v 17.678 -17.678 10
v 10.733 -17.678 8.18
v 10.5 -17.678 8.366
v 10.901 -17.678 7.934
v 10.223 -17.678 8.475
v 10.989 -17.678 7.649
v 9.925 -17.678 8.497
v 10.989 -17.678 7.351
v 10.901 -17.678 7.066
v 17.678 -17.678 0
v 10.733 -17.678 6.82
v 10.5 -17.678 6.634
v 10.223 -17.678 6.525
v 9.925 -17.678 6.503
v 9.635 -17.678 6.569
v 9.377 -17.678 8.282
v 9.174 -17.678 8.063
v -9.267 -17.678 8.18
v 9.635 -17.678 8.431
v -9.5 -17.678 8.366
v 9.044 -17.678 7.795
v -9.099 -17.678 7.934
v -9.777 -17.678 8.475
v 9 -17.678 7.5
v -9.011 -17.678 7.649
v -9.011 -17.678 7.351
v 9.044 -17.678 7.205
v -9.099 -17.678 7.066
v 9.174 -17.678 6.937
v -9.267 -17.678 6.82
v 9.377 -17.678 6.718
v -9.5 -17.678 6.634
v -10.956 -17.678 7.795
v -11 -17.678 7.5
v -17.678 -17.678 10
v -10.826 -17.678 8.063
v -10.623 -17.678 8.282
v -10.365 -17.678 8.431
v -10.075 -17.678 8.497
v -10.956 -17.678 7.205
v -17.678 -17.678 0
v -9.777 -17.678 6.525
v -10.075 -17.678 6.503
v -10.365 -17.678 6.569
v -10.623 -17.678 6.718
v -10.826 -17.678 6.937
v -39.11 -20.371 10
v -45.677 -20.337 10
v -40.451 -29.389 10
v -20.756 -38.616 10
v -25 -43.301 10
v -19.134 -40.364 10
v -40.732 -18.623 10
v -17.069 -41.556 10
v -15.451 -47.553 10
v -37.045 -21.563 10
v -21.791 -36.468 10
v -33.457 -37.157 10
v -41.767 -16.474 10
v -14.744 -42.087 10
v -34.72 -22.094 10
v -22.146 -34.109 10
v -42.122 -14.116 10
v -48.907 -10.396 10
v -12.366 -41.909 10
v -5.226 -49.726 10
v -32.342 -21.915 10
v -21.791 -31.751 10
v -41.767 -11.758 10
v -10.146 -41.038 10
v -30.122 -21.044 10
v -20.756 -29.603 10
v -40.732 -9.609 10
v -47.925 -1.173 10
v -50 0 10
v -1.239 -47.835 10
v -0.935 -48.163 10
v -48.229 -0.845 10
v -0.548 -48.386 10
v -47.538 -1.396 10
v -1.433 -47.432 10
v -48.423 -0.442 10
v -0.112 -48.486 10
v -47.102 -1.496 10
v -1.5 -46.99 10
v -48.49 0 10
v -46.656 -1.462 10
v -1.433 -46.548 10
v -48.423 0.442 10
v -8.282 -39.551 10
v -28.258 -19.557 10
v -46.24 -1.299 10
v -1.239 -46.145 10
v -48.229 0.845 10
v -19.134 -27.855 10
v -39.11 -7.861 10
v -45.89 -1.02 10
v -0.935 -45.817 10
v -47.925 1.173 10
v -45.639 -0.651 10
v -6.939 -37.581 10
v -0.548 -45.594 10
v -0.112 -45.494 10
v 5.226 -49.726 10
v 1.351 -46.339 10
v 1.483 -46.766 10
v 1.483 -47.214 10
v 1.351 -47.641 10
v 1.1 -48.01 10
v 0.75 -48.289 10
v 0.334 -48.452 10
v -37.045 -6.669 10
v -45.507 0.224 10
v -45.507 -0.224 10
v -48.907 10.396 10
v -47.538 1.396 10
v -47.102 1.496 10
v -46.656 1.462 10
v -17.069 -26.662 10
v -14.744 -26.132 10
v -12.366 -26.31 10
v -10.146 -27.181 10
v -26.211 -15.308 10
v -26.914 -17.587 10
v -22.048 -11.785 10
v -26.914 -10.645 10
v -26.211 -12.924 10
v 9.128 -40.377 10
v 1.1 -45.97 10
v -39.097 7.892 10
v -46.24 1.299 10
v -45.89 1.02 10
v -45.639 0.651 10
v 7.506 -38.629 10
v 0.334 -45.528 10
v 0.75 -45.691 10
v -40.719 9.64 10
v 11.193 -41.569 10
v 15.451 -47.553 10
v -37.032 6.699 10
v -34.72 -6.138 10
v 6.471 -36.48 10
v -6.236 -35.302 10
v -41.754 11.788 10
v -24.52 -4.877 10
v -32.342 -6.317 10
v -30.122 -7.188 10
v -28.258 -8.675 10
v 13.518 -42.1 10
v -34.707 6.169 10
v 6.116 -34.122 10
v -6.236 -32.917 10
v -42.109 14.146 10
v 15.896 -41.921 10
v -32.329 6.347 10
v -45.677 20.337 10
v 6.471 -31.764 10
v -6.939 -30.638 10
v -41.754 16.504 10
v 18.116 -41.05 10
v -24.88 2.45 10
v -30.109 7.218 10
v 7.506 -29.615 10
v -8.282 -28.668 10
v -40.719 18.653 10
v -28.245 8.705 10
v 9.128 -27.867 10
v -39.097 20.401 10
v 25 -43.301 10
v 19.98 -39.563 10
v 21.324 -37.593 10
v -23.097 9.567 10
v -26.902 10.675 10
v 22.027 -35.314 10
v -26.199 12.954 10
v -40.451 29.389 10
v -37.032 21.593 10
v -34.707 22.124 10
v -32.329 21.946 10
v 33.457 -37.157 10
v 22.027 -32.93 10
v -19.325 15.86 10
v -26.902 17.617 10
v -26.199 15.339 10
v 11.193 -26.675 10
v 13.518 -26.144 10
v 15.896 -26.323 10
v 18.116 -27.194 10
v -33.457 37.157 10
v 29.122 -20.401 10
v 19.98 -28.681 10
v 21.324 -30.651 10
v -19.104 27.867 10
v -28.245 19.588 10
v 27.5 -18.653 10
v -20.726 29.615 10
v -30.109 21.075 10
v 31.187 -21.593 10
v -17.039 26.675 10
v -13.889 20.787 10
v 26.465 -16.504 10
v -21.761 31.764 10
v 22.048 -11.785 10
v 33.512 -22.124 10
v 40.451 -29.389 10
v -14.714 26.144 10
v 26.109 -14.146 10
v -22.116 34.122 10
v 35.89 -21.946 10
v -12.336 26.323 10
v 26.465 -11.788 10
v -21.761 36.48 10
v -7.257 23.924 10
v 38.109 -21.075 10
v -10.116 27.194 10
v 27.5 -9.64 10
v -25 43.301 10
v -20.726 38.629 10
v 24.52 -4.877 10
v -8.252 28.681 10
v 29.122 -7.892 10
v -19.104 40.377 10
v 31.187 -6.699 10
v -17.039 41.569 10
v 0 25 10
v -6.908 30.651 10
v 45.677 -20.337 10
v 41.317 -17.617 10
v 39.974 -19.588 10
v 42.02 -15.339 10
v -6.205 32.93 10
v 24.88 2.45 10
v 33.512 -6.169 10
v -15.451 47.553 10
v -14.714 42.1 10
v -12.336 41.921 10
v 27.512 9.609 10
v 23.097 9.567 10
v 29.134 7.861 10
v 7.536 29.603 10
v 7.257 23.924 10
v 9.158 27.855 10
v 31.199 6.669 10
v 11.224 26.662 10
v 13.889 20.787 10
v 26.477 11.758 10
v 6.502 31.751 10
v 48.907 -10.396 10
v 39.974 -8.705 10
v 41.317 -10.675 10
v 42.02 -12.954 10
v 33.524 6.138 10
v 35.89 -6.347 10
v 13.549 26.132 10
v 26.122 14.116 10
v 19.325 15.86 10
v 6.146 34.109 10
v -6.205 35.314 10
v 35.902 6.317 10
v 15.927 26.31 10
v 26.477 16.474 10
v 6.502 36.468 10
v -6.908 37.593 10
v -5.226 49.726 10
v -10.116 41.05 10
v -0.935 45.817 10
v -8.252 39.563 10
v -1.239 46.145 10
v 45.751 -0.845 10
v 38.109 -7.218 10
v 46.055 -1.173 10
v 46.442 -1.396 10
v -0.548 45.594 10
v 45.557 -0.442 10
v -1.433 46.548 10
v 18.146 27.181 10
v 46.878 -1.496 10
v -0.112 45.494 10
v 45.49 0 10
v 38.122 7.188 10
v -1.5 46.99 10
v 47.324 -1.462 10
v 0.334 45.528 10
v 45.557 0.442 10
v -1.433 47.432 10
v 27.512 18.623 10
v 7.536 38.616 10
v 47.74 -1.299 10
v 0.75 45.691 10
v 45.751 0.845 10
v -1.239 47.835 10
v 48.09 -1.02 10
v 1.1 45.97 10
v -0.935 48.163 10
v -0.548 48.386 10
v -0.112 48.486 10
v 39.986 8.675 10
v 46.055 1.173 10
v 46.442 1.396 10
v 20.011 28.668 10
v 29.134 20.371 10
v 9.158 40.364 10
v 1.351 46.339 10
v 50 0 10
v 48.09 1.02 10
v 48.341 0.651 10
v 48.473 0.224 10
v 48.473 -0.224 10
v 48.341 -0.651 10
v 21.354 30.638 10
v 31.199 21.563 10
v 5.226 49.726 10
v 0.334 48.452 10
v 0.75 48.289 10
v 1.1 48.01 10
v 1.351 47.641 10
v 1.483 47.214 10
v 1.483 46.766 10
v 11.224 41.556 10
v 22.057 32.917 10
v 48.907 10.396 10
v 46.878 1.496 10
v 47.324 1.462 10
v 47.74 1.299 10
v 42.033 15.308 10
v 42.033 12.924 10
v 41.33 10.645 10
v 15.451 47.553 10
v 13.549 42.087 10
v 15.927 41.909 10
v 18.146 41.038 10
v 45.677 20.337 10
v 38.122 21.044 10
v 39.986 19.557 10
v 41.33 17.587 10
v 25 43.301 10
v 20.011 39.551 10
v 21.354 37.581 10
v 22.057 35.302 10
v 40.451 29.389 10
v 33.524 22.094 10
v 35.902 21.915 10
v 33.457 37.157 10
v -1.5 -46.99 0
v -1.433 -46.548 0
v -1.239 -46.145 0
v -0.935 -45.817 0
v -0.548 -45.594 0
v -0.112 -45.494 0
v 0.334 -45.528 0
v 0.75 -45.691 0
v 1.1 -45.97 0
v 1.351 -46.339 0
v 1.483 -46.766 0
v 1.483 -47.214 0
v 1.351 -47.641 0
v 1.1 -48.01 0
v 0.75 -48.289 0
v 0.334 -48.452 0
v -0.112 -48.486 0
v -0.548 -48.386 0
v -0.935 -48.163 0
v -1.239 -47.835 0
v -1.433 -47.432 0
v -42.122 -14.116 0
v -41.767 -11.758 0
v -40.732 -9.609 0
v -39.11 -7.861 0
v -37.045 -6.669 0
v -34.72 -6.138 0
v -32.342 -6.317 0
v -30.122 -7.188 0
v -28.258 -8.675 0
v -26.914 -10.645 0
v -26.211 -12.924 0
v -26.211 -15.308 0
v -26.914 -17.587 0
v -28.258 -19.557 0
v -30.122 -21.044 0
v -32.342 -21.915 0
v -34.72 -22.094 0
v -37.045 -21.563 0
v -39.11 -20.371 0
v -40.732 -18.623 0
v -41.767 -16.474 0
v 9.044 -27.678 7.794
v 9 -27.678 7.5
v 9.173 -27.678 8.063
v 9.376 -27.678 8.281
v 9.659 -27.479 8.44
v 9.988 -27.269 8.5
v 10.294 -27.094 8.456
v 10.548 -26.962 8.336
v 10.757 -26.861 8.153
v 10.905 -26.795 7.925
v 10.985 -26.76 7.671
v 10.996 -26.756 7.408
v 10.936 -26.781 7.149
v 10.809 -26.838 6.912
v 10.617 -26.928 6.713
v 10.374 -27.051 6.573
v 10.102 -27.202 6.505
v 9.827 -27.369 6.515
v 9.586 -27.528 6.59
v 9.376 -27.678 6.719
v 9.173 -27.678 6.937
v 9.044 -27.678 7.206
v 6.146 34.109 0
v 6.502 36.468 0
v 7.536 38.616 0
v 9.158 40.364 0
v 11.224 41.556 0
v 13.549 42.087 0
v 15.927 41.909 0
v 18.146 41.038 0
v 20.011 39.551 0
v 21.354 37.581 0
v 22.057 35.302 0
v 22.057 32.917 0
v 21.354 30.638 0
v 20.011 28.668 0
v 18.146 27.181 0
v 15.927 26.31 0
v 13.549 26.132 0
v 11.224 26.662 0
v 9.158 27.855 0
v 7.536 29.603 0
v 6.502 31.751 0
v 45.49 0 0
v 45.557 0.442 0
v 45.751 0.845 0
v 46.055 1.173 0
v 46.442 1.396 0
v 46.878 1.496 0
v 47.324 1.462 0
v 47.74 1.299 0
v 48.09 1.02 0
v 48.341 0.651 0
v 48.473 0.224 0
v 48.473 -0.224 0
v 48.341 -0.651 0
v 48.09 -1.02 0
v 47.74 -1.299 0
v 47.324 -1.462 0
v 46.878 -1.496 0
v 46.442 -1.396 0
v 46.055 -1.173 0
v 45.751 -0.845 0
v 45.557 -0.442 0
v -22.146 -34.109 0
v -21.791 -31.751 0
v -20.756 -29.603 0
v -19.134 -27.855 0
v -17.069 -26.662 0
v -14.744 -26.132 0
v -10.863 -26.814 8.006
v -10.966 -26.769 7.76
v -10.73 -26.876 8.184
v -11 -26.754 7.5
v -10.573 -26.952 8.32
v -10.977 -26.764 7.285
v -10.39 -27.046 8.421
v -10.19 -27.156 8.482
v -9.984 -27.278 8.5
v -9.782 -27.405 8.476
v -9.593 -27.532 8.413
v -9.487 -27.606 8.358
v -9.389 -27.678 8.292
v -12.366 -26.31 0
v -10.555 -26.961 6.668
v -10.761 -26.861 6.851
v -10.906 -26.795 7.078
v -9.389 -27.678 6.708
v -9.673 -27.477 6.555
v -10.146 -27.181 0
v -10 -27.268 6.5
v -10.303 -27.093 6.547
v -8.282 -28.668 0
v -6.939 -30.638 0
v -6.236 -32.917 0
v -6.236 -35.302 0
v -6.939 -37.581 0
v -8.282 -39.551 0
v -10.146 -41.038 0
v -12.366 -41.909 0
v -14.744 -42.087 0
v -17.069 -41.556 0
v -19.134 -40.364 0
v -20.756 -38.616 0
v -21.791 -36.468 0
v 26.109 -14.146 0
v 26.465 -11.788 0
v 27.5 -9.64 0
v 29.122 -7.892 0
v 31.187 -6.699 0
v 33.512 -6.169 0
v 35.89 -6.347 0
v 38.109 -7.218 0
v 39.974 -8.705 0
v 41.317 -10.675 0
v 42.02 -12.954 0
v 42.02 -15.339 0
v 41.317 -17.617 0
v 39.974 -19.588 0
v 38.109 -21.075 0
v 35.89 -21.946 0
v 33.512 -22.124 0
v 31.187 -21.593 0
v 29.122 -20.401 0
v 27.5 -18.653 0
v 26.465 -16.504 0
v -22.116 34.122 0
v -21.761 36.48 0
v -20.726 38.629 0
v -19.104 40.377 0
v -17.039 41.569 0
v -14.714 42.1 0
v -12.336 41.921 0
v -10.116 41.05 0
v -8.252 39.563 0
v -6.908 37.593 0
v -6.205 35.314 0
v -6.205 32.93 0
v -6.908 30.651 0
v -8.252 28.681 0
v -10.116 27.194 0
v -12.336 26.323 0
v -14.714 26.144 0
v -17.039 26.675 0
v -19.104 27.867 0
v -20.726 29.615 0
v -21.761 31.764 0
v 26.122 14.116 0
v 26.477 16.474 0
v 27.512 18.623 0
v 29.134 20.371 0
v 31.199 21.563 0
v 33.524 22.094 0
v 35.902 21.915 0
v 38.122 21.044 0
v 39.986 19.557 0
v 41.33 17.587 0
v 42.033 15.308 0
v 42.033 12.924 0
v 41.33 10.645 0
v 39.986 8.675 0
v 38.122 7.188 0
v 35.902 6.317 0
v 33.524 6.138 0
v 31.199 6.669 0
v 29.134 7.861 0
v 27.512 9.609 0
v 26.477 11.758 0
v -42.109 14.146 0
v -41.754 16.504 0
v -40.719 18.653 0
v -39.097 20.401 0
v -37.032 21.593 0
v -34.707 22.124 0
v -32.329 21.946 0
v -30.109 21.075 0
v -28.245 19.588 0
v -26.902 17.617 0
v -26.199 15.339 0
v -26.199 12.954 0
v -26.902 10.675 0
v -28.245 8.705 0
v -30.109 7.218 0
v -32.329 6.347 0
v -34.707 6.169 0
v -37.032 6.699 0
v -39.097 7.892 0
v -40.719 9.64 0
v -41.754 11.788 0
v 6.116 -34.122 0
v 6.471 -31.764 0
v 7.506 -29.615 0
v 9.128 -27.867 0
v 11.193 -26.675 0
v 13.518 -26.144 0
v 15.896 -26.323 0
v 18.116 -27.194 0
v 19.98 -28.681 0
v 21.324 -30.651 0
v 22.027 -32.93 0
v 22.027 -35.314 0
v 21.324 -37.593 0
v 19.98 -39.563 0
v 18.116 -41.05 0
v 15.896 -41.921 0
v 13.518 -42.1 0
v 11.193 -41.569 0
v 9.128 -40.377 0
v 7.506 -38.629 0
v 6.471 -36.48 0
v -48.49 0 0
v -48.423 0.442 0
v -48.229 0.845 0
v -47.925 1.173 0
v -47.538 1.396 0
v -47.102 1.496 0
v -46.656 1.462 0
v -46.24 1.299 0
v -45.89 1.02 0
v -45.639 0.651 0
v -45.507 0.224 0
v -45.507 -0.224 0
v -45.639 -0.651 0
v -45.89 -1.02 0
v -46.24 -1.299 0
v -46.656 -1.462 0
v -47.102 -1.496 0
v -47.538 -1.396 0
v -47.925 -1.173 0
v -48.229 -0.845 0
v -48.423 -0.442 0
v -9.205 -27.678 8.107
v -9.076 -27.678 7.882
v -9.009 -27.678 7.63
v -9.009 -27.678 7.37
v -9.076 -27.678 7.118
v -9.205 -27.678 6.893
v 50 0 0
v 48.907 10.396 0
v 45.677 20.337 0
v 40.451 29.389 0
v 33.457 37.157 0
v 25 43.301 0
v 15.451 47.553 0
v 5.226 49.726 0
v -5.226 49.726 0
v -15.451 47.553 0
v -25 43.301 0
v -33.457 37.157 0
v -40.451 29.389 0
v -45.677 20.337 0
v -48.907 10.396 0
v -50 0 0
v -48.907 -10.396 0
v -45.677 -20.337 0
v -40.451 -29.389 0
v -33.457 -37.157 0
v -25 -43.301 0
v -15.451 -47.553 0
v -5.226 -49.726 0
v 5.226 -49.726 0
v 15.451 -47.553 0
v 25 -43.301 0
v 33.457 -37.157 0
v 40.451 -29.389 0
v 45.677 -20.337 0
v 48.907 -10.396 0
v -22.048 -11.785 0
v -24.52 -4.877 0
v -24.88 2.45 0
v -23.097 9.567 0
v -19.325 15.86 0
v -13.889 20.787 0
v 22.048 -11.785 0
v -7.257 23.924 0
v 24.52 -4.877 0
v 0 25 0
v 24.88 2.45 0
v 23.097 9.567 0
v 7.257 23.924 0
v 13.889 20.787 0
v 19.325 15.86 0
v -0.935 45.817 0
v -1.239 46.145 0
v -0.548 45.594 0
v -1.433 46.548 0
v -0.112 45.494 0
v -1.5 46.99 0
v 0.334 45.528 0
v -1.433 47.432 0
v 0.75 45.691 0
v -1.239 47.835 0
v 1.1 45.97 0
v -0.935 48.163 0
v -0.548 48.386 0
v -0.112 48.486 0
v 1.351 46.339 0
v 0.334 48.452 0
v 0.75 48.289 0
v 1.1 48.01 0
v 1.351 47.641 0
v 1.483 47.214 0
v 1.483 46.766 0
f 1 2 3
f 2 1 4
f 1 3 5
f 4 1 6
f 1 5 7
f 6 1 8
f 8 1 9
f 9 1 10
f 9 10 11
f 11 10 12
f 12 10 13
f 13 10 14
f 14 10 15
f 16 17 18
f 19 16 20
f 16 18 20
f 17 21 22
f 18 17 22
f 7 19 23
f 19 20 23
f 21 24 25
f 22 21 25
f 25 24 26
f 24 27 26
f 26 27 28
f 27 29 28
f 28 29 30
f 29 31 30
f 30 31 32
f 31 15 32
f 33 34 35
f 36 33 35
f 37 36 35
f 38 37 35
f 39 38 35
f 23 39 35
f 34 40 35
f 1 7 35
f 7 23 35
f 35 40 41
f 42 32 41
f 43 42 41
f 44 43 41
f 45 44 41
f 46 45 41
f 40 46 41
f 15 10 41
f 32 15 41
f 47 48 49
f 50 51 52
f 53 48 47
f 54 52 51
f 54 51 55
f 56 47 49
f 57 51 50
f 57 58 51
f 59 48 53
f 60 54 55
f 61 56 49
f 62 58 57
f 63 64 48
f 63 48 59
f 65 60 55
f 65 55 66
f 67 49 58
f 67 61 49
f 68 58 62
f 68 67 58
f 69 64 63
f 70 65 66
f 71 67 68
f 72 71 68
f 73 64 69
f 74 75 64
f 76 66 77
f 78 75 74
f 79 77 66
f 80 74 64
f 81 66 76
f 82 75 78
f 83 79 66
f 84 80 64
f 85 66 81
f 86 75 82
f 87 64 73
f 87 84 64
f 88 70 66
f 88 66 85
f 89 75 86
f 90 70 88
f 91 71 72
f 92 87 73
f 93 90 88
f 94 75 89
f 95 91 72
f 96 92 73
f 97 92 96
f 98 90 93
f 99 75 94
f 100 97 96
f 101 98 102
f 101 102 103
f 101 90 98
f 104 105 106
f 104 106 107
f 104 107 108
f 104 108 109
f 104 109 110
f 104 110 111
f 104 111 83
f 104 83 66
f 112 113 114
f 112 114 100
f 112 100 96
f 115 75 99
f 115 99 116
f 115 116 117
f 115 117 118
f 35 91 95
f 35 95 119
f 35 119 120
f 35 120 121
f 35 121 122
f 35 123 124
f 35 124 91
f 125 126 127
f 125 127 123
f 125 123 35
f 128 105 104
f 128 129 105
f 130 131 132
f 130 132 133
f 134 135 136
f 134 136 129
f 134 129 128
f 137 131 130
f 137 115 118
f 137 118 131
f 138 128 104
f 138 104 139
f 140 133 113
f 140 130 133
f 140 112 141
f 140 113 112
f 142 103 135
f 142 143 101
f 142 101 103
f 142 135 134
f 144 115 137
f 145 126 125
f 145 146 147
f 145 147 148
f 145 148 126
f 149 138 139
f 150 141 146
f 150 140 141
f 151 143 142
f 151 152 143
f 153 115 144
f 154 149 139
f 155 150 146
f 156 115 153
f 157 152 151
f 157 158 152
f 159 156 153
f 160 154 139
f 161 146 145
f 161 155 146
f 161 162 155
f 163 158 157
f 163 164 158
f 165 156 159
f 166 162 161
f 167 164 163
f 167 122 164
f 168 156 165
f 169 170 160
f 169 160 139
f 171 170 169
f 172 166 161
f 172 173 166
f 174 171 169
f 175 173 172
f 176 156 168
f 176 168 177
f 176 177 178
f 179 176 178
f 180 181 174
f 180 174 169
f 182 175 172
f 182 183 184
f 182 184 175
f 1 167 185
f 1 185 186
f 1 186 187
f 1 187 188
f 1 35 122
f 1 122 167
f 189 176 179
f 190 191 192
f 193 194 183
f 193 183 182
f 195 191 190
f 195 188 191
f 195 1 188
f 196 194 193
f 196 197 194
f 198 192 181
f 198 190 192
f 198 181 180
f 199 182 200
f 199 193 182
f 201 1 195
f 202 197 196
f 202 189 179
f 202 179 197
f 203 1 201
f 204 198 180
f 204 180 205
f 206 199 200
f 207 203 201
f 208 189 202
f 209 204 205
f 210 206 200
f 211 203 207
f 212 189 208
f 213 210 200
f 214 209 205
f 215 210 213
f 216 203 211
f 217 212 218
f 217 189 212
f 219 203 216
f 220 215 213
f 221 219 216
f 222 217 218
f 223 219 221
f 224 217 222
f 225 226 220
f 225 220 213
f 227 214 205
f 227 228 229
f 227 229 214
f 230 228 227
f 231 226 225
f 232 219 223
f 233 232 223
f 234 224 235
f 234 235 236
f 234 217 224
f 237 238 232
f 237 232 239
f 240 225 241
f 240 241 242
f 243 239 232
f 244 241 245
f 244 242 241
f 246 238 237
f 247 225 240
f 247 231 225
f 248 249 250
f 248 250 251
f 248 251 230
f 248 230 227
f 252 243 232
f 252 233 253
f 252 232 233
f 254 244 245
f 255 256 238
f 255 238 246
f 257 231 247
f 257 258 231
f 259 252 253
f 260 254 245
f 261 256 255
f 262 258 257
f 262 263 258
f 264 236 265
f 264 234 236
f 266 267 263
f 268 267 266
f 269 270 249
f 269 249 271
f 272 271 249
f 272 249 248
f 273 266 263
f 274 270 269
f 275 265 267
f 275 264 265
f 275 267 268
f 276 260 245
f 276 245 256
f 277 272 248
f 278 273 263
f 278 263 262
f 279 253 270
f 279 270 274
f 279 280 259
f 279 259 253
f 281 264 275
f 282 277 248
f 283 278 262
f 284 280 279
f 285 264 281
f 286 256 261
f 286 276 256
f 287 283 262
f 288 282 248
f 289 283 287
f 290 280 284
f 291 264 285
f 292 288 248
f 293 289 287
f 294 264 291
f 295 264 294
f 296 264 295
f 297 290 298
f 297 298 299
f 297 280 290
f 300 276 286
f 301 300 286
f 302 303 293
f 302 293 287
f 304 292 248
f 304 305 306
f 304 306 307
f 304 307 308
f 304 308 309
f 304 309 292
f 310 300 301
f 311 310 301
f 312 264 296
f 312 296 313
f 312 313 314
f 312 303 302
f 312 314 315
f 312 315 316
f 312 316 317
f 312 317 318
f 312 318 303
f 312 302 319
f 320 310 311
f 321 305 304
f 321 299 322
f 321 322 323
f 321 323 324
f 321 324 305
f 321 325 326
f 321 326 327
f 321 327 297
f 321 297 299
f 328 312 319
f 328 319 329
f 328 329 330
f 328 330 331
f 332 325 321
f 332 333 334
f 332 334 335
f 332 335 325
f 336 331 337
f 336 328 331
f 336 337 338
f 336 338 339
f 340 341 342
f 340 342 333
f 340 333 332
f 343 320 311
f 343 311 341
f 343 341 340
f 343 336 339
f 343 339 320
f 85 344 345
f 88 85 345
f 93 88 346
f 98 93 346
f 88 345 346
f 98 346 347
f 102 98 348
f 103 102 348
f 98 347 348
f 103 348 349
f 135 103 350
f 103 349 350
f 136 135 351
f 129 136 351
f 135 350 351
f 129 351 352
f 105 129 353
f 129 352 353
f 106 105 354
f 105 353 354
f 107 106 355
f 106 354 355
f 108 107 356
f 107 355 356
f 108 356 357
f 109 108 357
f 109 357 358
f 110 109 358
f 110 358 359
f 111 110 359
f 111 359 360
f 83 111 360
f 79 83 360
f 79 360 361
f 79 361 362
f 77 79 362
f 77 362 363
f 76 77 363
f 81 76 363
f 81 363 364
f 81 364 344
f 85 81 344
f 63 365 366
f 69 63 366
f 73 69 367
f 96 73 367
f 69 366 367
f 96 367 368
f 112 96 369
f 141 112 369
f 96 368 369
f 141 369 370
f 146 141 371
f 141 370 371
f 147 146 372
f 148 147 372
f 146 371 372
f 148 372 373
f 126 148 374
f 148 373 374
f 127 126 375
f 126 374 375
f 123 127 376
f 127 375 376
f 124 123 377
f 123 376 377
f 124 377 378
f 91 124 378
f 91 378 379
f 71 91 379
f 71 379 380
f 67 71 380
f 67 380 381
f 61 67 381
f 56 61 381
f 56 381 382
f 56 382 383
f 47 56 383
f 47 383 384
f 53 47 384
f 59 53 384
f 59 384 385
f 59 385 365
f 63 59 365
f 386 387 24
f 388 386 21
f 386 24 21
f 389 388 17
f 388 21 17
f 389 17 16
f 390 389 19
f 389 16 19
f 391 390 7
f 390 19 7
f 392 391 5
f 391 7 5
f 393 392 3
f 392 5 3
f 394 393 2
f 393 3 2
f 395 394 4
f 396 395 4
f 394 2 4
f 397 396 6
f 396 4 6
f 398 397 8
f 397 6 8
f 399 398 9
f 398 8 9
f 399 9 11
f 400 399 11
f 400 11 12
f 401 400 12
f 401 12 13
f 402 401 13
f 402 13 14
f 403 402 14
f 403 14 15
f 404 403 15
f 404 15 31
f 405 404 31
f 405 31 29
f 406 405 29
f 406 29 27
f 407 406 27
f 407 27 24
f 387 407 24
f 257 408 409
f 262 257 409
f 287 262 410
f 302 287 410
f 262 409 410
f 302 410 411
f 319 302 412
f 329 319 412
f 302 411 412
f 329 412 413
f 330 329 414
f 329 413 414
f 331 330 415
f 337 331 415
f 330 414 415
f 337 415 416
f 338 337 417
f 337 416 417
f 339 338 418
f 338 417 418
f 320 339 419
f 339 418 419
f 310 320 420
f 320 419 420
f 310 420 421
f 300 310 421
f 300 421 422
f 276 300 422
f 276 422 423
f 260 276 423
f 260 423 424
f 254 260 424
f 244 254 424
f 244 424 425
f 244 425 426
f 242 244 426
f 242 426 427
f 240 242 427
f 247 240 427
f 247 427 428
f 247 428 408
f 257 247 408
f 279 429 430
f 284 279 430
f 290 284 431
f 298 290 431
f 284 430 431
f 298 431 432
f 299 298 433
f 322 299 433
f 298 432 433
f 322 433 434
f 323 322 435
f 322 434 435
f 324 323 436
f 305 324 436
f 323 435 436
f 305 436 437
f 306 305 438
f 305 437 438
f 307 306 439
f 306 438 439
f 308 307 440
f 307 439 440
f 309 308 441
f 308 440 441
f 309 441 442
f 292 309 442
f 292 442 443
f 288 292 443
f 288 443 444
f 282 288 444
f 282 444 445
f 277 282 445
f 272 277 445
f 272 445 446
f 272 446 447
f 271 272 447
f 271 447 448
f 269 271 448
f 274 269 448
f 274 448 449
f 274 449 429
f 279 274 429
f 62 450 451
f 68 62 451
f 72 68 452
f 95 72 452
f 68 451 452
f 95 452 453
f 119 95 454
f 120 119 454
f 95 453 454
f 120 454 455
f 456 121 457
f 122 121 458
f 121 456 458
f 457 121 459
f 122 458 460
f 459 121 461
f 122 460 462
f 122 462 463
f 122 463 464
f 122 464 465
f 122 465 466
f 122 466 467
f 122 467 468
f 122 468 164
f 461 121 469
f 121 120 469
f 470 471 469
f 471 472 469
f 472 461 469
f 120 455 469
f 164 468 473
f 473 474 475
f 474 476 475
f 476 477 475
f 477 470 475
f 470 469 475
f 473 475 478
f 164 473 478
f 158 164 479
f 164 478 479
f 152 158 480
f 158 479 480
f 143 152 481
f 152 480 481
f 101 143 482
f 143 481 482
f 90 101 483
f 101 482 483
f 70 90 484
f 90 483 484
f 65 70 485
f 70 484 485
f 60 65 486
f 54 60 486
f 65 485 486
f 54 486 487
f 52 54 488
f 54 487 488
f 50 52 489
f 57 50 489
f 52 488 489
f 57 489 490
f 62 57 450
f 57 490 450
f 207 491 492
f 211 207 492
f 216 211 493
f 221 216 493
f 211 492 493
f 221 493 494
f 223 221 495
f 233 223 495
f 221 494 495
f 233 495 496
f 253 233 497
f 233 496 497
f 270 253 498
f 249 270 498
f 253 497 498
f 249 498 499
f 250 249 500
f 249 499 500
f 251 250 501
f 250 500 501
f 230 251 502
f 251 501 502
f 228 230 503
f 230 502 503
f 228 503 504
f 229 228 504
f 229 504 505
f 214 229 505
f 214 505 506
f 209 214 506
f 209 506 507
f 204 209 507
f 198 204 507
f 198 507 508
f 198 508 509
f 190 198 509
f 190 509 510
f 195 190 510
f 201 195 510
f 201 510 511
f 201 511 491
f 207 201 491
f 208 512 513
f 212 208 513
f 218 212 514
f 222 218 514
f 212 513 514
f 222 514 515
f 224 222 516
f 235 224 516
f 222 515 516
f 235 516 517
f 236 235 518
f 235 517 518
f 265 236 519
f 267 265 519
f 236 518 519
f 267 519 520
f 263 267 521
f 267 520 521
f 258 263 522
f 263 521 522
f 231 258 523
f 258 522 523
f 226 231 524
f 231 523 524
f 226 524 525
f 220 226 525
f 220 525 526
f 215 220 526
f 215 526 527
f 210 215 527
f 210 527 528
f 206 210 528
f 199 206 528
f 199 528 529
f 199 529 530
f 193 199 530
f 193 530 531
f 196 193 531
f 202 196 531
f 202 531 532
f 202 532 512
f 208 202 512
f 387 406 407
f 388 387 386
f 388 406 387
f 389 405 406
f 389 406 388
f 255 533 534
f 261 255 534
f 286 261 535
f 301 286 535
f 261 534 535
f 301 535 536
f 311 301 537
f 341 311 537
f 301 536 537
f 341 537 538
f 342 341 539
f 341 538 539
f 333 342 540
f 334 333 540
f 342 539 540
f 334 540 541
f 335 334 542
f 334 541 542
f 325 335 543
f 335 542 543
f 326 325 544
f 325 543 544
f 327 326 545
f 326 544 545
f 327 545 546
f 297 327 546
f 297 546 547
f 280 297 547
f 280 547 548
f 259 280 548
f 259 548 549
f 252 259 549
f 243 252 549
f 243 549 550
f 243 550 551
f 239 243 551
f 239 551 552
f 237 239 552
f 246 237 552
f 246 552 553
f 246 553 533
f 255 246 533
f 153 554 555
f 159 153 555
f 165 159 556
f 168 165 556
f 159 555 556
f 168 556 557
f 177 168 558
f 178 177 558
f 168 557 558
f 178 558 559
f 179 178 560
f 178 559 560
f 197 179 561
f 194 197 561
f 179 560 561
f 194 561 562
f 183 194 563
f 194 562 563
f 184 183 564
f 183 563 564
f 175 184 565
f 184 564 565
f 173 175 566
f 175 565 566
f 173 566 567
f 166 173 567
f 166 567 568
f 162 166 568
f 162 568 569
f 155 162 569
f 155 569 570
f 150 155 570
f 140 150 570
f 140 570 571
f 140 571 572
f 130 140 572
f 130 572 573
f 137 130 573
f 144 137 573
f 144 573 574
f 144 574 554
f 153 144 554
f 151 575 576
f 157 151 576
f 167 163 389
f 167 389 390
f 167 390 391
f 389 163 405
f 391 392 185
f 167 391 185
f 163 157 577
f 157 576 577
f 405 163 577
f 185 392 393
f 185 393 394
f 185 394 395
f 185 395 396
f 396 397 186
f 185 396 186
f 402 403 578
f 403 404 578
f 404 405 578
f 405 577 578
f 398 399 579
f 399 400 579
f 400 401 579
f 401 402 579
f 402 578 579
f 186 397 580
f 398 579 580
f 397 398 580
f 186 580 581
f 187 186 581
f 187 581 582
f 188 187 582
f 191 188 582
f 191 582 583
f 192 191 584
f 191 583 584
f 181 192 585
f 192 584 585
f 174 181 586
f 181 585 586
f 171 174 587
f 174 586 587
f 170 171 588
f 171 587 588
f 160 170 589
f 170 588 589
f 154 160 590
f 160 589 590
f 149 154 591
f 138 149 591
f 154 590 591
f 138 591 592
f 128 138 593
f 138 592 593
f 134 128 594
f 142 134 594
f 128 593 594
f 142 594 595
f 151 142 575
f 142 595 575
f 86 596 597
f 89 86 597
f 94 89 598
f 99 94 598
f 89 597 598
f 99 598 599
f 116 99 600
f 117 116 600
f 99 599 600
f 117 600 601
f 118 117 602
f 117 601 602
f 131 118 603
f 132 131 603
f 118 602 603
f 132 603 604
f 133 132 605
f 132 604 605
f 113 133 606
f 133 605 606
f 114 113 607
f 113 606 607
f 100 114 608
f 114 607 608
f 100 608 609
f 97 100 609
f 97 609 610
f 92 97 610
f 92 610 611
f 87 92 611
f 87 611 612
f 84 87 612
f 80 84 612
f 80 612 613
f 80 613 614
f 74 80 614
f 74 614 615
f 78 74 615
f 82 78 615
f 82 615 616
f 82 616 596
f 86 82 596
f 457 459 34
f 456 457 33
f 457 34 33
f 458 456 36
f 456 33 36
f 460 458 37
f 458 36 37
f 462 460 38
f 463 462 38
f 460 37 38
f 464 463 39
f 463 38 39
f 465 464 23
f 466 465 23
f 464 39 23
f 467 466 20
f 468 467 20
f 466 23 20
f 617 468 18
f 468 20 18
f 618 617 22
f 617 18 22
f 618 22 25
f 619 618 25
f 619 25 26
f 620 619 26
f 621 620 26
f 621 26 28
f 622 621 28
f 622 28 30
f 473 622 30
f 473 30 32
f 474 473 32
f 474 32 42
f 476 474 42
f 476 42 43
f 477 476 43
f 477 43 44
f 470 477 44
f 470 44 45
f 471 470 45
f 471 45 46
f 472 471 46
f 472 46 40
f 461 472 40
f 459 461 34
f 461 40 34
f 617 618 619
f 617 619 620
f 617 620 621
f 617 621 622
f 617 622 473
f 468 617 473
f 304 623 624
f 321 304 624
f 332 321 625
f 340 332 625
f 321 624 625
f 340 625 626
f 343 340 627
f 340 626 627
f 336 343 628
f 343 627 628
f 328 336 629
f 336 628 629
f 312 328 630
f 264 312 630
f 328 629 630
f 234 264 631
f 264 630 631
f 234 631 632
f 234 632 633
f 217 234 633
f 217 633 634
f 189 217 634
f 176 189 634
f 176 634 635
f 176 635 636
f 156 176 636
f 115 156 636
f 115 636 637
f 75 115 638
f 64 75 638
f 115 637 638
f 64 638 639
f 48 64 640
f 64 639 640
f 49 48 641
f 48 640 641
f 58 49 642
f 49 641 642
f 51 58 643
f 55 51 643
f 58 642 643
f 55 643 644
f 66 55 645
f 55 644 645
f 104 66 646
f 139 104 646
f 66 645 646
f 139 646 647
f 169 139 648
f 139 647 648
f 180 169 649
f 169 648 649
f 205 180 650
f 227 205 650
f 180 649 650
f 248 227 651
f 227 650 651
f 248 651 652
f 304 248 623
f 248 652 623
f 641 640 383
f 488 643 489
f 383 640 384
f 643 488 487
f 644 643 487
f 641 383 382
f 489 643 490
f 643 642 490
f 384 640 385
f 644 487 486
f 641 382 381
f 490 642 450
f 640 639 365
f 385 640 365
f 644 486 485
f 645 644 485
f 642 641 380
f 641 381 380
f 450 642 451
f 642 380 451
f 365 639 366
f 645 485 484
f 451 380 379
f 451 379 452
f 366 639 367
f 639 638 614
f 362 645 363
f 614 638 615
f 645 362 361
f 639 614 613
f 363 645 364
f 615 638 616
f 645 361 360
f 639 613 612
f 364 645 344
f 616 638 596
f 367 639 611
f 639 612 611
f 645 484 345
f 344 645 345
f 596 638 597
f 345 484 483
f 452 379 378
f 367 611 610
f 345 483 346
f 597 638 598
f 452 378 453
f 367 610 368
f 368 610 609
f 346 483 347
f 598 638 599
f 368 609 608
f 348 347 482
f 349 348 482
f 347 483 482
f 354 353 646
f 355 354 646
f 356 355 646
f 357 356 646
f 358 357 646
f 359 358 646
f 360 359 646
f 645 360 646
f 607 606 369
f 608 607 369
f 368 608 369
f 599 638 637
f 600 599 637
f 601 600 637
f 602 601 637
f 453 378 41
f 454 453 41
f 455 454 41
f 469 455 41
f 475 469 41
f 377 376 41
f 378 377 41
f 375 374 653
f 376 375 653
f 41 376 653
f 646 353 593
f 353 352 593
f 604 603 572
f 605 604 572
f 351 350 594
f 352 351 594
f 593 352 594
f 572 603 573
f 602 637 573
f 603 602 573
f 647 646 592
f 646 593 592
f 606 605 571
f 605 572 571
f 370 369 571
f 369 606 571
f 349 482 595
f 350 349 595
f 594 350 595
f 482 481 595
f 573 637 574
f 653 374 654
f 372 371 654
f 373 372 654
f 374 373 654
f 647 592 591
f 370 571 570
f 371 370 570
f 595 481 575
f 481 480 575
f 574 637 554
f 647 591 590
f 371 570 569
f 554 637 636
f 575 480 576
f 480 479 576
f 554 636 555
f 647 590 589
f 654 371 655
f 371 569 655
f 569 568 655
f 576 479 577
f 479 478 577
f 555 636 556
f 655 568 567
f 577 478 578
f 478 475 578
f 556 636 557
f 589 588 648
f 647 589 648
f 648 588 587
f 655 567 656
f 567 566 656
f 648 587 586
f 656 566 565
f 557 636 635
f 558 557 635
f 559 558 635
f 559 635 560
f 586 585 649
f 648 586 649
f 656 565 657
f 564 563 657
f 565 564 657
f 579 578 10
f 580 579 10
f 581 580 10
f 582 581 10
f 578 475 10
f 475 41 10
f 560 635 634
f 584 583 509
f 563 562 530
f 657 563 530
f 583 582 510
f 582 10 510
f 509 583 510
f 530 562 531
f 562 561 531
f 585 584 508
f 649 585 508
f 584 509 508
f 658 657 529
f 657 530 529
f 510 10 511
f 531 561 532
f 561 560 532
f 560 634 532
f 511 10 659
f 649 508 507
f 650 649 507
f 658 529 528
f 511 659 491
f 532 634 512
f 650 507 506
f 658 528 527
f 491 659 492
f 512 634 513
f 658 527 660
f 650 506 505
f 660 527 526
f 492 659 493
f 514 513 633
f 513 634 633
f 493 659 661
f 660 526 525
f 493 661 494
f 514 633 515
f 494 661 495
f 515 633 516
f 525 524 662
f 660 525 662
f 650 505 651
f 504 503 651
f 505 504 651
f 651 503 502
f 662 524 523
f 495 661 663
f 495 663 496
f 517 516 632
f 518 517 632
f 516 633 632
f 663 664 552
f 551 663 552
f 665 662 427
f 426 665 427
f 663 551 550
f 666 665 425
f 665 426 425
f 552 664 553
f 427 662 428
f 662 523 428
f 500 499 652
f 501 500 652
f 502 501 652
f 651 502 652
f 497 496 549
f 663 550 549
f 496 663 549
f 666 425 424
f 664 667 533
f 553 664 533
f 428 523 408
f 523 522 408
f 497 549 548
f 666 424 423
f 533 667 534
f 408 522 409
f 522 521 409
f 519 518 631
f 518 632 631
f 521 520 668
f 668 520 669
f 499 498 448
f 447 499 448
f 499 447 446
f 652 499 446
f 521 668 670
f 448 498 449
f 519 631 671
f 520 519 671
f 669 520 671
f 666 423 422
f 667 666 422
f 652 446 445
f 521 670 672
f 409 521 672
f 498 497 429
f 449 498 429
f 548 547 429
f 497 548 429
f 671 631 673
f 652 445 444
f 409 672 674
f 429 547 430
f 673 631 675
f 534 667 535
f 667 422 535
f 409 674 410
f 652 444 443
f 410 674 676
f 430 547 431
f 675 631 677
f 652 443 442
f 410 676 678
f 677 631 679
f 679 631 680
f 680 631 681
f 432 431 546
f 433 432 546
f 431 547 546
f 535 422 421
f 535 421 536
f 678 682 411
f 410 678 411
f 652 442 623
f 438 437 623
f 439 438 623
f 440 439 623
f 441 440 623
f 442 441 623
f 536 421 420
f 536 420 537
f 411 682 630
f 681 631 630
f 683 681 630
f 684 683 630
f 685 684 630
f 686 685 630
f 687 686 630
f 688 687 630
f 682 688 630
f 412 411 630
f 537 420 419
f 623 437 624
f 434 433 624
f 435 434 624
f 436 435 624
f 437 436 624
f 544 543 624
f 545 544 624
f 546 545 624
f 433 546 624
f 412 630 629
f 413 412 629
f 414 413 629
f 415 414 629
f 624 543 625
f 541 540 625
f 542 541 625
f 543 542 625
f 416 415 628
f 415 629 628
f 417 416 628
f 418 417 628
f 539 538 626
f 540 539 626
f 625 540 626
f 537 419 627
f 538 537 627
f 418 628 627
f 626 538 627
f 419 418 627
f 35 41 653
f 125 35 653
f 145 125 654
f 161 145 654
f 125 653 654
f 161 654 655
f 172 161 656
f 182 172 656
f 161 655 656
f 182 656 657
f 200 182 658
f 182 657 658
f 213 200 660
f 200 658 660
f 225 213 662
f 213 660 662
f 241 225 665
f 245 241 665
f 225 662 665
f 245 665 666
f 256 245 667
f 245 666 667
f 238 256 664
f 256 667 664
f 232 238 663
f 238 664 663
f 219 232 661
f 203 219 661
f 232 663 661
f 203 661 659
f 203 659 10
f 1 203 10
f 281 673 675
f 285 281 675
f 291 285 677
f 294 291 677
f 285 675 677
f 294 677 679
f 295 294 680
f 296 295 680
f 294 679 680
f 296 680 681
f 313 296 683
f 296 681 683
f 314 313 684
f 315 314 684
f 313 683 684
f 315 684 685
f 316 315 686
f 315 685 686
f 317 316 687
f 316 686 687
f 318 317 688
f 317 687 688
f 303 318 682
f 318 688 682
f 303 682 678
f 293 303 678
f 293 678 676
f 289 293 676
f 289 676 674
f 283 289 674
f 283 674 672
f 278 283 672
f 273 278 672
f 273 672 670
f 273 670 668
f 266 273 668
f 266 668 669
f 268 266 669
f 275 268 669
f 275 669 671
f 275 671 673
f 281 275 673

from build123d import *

# Parameters (mm, degrees)
SKETCH1_R           = 50
BOSS_EXTRUDE1_DEPTH = 10
SKETCH3_R           = 8
CUT_EXTRUDE1_DEPTH  = 20
SKETCH4_R           = 1.5
CUT_EXTRUDE2_DEPTH  = 30
SKETCH5_R           = 1
CUT_EXTRUDE3_DEPTH  = 10


with BuildPart() as part:
    # Sketch1 → Boss-Extrude1 (new body)
    with BuildSketch(Plane.XY):
        Circle(SKETCH1_R)
        with BuildLine():
            Line((17.67766953, -17.67766953), (-17.67766953, -17.67766953))
            ThreePointArc((-17.67766953, -17.67766953), (0, 25), (17.67766953, -17.67766953))
        make_face(mode=Mode.SUBTRACT)
    extrude(amount=BOSS_EXTRUDE1_DEPTH)

    # Sketch3 → Cut-Extrude1 (cut)
    with BuildSketch(Plane(origin=(0, 0, 0), x_dir=(-1, 0, 0), z_dir=(0, 0, -1))):
        with Locations((-14.146357726, 34.109474384)):
            Circle(SKETCH3_R)
        with Locations((14.116055163, 34.122026117)):
            Circle(SKETCH3_R)
        with Locations((34.109474384, 14.146357726)):
            Circle(SKETCH3_R)
        with Locations((34.122026117, -14.116055163)):
            Circle(SKETCH3_R)
        with Locations((14.146357726, -34.109474384)):
            Circle(SKETCH3_R)
        with Locations((-14.116055163, -34.122026117)):
            Circle(SKETCH3_R)
        with Locations((-34.109474384, -14.146357726)):
            Circle(SKETCH3_R)
        with Locations((-34.122026117, 14.116055163)):
            Circle(SKETCH3_R)
    extrude(amount=-CUT_EXTRUDE1_DEPTH, mode=Mode.SUBTRACT)

    # Sketch4 → Cut-Extrude2 (cut)
    with BuildSketch(Plane(origin=(0, 0, 0), x_dir=(-1, 0, 0), z_dir=(0, 0, -1))):
        with Locations((0, 46.99)):
            Circle(SKETCH4_R)
        with Locations((46.99, 0)):
            Circle(SKETCH4_R)
        with Locations((0, -46.99)):
            Circle(SKETCH4_R)
        with Locations((-46.99, 0)):
            Circle(SKETCH4_R)
    extrude(amount=-CUT_EXTRUDE2_DEPTH, mode=Mode.SUBTRACT)

    # Sketch5 → Cut-Extrude3 (cut)
    with BuildSketch(Plane(origin=(0, -17.67766953, 0), x_dir=(1, 0, 0), z_dir=(0, 1, 0))):
        with Locations(Location((10, -7.5, 0), (0, 0, 180))):
            Circle(SKETCH5_R)
        with Locations(Location((-10, -7.5, 0), (0, 0, 180))):
            Circle(SKETCH5_R)
    extrude(amount=-CUT_EXTRUDE3_DEPTH, mode=Mode.SUBTRACT)


solid = part.part
